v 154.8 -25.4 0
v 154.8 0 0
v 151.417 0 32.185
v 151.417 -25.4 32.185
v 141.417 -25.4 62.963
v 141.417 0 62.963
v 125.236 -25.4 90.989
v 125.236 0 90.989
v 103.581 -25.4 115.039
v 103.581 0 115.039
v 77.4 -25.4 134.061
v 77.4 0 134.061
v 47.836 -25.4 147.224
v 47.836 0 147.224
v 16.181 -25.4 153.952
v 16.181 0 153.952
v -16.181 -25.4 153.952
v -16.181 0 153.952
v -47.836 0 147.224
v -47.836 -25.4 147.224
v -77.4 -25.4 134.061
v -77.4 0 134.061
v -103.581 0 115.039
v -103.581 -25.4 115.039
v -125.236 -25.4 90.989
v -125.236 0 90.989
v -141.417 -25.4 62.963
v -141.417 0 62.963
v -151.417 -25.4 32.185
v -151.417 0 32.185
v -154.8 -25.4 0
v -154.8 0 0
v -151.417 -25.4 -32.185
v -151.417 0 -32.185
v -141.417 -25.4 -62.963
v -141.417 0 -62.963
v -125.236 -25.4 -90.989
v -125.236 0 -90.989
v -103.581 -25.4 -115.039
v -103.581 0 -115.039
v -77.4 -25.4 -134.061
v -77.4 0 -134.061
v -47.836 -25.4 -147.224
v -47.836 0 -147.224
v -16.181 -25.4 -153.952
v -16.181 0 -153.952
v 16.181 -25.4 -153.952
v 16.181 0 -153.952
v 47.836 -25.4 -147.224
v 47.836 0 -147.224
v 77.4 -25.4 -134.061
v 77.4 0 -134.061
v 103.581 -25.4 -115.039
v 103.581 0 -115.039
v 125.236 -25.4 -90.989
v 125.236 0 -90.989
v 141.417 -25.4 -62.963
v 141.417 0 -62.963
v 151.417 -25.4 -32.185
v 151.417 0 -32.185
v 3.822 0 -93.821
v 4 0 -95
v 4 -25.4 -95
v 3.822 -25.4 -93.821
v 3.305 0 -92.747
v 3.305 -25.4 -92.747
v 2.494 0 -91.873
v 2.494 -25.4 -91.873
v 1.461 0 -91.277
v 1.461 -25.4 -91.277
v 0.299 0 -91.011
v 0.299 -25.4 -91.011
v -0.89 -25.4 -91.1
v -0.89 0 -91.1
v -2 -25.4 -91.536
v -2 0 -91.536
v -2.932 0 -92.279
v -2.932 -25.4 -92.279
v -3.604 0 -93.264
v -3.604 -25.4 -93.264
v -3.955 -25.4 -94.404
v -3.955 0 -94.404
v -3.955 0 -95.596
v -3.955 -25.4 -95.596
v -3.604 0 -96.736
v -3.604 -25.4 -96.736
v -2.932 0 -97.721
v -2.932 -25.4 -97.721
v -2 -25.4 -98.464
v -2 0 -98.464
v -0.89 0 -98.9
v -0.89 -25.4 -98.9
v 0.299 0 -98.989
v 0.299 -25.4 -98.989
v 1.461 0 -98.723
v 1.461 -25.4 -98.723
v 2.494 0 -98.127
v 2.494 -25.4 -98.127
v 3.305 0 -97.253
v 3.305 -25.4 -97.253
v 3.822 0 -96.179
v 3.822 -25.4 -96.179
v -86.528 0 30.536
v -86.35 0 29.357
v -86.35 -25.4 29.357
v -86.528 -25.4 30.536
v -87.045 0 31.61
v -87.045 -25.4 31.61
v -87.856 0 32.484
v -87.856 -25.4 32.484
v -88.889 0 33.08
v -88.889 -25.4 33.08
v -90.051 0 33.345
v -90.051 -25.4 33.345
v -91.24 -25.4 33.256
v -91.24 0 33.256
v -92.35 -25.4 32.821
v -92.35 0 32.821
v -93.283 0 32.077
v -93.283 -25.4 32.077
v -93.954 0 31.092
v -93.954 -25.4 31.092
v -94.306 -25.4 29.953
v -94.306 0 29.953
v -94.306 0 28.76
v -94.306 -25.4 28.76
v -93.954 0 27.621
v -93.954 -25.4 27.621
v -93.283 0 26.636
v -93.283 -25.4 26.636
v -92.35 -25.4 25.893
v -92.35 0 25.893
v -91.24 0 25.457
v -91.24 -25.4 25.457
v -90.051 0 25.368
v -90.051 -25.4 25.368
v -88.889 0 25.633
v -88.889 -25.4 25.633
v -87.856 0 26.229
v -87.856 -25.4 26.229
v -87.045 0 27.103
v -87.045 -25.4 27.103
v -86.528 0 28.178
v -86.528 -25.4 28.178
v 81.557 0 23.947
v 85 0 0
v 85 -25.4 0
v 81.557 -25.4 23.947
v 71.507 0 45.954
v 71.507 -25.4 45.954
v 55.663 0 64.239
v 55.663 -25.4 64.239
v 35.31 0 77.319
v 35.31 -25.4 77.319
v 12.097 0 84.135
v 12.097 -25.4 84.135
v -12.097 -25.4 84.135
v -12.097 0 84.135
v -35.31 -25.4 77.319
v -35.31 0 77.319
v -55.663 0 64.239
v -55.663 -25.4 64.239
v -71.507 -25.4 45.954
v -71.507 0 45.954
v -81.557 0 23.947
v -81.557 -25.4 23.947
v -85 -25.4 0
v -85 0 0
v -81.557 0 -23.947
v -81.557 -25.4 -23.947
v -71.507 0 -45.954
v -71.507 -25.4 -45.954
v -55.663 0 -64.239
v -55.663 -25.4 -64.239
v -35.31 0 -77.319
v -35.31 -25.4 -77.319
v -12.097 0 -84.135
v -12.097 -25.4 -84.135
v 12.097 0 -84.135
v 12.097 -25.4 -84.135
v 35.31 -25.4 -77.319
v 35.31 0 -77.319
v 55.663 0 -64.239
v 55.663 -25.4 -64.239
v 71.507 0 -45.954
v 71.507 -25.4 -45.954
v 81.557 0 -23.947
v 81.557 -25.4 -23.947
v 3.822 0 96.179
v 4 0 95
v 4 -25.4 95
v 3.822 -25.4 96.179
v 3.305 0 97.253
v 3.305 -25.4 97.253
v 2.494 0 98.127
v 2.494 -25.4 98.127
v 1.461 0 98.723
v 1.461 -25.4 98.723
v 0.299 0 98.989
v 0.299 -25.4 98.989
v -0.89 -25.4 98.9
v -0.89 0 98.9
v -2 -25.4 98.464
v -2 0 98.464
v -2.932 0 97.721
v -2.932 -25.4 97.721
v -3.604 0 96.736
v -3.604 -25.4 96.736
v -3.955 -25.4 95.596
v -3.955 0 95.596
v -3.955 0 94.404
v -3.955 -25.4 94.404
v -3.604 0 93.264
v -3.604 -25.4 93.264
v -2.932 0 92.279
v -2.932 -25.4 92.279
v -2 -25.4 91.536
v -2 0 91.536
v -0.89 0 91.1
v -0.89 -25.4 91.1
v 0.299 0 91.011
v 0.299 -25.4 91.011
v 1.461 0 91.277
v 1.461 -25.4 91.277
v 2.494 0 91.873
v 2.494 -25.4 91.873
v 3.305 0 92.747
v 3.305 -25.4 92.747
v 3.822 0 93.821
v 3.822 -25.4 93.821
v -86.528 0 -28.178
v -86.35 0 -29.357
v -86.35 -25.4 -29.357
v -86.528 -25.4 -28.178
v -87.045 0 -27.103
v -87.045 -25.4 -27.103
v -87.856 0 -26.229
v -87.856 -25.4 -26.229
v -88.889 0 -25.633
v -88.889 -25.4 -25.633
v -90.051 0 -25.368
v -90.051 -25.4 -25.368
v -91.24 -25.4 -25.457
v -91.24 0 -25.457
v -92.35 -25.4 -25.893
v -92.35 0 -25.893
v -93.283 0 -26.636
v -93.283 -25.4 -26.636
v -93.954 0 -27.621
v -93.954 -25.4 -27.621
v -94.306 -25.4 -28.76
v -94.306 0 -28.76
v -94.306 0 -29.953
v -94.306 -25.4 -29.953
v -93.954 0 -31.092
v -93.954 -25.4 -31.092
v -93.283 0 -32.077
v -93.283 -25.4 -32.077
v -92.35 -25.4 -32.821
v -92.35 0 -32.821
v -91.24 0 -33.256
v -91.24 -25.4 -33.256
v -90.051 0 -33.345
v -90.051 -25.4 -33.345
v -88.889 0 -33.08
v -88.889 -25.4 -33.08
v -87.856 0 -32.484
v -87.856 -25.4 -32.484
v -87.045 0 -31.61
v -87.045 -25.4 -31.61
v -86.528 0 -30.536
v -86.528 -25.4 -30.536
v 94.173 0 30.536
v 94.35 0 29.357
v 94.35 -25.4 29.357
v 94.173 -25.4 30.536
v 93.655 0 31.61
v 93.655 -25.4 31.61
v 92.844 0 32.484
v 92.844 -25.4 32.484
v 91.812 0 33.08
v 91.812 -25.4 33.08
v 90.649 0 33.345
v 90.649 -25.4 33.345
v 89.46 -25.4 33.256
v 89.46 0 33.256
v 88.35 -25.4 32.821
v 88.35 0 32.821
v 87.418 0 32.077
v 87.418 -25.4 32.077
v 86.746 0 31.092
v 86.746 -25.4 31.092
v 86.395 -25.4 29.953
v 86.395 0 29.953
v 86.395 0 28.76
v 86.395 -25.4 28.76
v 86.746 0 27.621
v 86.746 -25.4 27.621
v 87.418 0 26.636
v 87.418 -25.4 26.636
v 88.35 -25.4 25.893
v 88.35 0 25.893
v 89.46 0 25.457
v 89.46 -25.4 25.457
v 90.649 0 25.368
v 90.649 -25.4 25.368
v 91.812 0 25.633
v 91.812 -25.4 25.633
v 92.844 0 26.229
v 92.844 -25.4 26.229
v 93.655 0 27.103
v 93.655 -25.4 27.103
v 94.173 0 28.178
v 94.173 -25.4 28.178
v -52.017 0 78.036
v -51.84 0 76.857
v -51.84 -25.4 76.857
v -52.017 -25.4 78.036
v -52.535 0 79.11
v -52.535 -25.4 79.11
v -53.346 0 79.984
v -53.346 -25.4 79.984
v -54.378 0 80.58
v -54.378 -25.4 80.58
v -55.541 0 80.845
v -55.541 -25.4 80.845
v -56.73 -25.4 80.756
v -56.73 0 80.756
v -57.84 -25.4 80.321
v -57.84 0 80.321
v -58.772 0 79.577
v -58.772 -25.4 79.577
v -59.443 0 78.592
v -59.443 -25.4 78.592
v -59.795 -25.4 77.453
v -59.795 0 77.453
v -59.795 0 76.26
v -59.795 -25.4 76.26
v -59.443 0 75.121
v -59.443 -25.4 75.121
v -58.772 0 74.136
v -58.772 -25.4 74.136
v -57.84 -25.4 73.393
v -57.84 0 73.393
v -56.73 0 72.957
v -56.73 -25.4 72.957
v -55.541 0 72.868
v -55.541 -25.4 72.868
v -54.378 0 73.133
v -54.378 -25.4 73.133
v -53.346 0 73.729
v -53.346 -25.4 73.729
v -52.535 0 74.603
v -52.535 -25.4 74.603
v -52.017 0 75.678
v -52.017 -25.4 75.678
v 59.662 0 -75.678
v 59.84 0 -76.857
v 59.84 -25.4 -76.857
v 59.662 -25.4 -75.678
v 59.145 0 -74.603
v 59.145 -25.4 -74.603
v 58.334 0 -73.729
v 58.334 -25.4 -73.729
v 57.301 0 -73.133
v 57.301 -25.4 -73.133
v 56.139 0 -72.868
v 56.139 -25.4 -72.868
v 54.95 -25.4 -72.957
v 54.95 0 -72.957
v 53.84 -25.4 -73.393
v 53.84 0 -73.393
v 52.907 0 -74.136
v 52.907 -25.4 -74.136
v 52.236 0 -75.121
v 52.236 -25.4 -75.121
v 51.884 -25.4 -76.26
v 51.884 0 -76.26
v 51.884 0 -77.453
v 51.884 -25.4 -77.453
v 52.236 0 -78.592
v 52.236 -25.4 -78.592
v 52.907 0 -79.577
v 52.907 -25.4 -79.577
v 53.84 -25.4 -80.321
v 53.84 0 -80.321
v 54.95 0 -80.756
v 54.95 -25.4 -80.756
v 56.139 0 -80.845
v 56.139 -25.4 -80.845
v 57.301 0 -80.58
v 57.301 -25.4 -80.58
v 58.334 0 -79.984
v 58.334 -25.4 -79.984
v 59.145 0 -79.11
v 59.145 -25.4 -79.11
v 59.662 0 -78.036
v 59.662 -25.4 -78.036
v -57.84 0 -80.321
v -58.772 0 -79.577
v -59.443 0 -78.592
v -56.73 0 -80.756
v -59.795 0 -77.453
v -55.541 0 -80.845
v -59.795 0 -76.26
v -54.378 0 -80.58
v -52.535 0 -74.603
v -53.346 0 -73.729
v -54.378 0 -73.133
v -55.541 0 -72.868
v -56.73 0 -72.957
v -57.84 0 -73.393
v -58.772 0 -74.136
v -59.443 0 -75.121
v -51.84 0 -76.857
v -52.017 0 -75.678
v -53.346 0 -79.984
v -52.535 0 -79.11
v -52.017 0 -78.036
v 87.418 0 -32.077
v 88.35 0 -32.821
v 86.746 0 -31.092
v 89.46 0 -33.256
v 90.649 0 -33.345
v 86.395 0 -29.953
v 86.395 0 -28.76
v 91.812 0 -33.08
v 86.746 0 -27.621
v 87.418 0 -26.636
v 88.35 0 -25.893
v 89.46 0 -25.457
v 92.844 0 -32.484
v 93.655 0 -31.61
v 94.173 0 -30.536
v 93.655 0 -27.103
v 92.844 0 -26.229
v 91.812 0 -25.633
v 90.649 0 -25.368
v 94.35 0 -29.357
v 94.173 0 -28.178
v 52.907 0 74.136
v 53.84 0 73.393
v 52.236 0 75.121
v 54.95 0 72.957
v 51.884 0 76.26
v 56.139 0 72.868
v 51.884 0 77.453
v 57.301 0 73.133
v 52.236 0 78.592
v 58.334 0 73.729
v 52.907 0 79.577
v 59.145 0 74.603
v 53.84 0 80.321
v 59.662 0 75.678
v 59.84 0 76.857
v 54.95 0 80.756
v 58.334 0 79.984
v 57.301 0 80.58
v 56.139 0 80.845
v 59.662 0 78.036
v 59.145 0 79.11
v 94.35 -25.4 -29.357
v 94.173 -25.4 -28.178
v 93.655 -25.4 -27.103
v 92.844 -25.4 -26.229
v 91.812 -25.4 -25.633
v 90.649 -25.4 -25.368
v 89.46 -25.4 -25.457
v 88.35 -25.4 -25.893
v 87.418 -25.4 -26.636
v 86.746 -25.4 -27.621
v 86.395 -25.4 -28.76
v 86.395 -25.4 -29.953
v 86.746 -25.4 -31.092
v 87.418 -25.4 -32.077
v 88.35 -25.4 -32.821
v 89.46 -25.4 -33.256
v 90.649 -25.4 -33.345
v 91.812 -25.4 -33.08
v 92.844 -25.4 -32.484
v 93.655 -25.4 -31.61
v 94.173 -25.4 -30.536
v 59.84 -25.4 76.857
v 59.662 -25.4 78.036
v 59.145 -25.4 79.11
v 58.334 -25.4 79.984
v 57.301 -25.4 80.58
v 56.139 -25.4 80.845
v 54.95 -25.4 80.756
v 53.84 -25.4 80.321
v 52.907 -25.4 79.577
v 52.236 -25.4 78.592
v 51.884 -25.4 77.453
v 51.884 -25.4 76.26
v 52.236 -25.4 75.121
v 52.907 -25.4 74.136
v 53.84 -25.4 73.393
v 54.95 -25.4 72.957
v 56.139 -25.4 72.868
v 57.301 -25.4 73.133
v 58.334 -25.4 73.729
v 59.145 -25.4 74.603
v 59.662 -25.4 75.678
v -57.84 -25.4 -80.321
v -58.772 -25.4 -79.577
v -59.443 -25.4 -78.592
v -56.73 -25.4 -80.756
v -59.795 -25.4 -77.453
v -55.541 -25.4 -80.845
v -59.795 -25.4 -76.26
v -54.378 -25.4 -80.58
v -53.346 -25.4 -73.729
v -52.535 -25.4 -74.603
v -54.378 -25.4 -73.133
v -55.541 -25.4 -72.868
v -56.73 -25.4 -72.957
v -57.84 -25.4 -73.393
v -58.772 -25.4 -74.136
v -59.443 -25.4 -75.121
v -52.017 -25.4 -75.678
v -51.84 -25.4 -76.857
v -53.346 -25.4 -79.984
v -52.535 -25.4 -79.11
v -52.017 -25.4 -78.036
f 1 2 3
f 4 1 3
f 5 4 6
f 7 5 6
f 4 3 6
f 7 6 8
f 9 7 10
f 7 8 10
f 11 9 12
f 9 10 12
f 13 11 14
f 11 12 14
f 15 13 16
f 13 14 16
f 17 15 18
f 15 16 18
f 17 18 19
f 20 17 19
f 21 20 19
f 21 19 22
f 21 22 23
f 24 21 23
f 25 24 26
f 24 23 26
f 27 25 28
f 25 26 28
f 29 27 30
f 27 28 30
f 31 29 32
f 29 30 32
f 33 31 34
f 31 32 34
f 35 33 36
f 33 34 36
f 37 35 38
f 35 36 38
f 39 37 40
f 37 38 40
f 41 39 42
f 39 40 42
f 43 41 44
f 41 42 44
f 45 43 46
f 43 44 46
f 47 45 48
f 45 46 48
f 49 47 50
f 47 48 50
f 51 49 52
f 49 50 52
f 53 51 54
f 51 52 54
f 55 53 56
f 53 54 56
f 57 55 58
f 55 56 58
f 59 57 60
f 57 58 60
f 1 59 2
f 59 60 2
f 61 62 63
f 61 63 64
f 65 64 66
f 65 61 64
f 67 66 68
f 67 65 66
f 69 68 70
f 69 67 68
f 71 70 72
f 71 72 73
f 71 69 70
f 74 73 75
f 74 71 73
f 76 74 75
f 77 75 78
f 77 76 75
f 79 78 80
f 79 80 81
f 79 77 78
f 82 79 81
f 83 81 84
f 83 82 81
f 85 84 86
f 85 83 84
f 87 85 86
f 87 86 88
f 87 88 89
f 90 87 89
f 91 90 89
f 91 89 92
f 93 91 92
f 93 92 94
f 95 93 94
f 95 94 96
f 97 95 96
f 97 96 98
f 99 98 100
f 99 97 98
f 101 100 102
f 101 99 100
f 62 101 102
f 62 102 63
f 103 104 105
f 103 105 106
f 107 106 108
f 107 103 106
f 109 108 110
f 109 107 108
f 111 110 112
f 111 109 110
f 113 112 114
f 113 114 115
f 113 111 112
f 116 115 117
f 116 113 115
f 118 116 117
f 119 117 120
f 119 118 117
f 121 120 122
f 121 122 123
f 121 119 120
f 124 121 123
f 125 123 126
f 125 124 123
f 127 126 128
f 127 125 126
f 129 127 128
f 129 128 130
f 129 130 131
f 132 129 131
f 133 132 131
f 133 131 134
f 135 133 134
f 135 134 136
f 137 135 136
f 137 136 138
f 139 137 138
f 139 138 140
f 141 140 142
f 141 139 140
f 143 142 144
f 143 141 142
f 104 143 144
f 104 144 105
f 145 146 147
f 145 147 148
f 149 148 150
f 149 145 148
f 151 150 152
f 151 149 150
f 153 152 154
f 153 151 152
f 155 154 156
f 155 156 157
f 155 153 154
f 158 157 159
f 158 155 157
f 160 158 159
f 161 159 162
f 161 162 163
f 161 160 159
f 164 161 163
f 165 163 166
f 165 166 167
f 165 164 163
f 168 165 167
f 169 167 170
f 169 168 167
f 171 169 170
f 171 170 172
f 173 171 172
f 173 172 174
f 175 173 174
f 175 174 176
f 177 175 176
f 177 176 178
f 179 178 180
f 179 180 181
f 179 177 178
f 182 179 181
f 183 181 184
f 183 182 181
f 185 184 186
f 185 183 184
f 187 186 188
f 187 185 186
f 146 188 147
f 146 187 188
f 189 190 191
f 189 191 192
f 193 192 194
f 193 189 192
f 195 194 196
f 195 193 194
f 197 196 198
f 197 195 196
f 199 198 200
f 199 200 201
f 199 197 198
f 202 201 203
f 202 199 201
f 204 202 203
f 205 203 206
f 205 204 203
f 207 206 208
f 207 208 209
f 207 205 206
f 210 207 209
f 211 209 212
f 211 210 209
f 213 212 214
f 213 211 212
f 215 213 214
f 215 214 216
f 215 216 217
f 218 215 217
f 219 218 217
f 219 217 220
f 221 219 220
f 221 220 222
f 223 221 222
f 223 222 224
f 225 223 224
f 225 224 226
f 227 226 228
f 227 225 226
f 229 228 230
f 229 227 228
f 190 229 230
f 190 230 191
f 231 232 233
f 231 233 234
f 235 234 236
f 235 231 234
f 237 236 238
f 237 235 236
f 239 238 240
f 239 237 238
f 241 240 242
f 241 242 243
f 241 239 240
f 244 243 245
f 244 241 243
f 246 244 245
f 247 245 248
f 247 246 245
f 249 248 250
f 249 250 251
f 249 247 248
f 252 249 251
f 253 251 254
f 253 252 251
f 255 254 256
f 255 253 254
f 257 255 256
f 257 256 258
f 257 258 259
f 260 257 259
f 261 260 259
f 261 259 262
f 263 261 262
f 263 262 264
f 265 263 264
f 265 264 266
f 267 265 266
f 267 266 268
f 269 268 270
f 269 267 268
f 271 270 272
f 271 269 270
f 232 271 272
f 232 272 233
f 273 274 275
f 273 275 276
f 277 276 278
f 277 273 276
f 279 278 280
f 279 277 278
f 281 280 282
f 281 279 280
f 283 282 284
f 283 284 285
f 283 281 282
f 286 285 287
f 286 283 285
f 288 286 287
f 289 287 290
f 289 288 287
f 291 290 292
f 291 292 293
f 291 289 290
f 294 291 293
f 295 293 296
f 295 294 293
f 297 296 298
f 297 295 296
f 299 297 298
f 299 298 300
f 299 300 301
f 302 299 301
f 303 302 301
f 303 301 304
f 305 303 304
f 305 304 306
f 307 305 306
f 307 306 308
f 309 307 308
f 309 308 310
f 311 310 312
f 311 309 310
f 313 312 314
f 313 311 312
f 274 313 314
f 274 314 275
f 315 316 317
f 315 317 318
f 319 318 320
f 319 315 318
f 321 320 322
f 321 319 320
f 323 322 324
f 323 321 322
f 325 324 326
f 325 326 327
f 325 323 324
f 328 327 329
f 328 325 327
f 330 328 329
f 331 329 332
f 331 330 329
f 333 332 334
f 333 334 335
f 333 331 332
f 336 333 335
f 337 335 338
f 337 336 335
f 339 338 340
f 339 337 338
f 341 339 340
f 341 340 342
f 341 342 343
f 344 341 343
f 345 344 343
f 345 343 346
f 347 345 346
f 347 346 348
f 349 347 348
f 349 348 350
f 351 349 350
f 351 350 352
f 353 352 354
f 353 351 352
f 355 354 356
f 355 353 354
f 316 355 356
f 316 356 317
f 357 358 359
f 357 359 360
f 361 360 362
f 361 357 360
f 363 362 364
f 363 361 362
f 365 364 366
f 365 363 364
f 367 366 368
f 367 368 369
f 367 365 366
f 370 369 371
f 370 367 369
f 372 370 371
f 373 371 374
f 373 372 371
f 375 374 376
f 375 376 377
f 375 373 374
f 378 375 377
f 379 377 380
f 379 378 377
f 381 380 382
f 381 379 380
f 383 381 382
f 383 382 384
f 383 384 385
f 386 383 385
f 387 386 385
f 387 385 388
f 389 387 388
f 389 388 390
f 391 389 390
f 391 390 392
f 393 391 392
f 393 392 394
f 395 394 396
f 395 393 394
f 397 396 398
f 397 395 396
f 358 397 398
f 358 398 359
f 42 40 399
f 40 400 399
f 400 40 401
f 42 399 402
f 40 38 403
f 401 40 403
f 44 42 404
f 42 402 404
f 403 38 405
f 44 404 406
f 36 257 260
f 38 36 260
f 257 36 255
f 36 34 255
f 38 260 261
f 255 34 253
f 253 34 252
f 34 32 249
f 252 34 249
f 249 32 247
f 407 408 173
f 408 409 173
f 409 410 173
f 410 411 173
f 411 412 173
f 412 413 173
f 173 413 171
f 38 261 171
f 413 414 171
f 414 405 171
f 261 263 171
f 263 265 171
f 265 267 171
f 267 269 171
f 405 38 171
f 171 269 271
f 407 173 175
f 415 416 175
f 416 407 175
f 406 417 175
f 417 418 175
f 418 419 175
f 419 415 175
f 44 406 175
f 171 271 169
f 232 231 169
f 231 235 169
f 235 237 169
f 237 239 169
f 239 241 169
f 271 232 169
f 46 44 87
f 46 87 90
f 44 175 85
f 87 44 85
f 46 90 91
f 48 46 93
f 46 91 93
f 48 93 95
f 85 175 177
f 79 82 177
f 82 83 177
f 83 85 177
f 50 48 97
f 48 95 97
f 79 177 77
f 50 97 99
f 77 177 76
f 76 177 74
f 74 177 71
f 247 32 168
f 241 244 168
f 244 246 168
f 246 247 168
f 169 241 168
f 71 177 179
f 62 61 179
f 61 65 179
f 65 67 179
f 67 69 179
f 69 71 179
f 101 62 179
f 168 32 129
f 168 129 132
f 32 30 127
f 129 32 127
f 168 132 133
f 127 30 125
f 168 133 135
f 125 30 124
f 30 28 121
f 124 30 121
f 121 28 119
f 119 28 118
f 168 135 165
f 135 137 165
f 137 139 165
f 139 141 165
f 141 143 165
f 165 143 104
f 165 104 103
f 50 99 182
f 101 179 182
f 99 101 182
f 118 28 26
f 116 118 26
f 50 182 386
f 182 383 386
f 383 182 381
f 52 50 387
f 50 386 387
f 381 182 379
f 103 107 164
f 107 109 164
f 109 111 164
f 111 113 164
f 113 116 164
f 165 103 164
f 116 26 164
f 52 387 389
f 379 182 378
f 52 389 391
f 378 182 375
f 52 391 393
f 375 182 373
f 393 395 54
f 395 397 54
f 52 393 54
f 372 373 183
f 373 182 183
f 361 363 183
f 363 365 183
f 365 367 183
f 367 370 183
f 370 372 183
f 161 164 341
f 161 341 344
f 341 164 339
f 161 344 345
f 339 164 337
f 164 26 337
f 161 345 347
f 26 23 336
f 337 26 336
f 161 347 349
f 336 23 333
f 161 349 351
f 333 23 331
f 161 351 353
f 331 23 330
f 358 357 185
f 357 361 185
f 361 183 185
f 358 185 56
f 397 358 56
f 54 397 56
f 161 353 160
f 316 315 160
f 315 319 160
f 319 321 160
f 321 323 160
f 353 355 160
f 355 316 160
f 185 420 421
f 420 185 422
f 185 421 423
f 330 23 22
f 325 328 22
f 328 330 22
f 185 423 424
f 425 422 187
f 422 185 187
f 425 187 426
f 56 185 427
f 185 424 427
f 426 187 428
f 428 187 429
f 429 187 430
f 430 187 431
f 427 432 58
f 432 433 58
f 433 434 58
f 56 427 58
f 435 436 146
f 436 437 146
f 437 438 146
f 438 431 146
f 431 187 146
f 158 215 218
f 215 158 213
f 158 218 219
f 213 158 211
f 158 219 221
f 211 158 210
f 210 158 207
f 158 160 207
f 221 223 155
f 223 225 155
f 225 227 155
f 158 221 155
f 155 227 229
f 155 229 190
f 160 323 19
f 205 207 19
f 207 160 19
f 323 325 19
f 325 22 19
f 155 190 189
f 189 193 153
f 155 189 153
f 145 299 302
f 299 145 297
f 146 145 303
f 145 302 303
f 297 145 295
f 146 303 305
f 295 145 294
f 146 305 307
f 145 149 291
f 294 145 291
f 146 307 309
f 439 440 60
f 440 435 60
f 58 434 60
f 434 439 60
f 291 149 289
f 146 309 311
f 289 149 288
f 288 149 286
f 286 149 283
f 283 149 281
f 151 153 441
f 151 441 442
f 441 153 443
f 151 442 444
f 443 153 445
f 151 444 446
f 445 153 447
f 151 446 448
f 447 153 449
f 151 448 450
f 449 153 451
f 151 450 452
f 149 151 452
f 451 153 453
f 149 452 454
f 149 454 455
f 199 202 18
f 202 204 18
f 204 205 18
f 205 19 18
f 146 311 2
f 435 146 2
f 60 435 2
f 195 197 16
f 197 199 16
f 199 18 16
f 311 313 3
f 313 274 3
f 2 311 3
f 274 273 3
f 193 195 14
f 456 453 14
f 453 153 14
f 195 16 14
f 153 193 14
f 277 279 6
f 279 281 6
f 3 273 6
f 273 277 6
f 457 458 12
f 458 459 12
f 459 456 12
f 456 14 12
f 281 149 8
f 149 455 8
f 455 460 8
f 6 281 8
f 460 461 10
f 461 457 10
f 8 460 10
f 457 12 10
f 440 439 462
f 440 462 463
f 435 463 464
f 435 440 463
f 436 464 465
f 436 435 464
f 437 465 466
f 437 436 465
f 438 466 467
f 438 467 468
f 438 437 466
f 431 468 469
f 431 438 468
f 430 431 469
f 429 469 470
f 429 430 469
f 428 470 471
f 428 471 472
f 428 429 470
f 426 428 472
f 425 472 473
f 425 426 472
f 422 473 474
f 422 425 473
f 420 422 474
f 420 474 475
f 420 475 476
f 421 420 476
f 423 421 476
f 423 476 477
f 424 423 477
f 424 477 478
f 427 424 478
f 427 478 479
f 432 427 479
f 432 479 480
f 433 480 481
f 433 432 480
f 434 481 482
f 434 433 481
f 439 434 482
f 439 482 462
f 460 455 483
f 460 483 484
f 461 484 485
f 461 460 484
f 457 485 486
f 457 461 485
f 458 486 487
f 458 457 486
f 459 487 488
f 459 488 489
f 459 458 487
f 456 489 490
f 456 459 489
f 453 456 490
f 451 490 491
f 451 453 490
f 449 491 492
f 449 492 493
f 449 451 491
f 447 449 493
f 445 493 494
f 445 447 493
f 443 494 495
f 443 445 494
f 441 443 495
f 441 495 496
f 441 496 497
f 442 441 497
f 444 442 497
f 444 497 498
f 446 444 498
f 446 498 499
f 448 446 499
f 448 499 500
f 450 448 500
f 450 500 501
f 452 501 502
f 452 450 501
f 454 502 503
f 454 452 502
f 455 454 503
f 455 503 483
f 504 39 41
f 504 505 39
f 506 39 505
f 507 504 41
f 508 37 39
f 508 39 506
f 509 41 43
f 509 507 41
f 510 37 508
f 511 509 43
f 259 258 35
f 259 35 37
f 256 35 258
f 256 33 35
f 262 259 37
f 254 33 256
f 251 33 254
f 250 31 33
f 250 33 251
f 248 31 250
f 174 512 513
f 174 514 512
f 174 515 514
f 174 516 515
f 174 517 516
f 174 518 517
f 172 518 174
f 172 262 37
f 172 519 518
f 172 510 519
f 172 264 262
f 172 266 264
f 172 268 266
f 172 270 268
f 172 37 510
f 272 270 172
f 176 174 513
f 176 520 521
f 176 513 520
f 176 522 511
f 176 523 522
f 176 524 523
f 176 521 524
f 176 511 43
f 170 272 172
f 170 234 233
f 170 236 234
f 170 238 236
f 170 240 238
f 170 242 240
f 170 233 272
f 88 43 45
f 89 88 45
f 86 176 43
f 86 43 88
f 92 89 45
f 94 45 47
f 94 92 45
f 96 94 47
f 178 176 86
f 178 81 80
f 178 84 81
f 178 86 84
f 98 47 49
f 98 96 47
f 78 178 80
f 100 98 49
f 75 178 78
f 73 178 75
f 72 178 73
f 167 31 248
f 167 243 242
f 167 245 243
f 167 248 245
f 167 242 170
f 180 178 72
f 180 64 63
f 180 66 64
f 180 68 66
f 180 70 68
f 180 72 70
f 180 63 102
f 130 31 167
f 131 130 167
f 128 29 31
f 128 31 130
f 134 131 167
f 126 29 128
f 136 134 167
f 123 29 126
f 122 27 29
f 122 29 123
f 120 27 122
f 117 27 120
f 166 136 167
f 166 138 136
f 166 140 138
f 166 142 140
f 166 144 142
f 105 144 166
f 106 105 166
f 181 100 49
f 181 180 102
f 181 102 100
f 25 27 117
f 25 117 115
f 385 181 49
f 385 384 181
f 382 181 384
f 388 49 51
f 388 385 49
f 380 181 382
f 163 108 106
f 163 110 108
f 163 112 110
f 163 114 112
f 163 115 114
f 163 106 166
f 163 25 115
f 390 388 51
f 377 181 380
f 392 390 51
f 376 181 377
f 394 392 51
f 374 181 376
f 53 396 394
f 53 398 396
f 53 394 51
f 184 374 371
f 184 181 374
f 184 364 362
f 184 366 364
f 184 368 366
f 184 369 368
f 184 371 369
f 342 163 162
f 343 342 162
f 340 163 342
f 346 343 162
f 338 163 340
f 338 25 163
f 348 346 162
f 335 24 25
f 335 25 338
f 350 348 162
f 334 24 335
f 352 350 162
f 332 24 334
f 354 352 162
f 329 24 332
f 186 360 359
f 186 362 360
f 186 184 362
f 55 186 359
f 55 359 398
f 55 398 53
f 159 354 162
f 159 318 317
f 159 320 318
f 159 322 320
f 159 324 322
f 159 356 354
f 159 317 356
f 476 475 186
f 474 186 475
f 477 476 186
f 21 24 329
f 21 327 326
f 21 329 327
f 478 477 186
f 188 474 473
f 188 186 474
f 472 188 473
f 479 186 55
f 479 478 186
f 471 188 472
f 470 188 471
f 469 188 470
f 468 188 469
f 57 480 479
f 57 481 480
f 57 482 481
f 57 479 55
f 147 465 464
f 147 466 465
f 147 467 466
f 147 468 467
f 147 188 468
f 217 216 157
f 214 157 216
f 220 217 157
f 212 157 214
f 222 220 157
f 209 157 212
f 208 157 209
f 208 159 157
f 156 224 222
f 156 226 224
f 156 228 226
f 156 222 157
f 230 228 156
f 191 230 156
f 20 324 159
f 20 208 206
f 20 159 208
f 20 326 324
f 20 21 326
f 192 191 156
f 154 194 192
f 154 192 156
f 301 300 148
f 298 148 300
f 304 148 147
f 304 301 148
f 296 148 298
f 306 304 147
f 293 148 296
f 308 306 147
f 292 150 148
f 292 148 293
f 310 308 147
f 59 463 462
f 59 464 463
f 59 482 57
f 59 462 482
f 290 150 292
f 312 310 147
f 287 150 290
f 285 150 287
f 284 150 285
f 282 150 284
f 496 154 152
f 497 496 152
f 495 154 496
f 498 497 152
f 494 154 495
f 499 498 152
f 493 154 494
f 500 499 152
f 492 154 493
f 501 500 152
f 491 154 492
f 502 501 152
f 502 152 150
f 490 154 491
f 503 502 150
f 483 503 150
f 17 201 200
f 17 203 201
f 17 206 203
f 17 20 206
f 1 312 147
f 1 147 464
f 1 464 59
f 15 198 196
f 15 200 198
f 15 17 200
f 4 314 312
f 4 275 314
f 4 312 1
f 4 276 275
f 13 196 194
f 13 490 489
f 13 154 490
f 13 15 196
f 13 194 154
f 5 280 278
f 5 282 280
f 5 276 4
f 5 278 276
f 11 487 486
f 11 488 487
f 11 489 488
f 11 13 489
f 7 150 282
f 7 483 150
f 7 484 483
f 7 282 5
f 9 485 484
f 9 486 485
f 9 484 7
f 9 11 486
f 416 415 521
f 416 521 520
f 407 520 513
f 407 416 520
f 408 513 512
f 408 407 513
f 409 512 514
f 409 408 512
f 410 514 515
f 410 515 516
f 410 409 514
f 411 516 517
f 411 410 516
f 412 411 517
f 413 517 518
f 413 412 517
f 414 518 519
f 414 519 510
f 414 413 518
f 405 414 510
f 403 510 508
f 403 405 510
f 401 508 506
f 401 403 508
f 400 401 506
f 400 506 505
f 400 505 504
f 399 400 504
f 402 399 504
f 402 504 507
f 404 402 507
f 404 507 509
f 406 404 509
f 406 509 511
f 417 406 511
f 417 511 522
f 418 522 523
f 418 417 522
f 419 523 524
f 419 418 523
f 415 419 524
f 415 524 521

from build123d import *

# Parameters (mm, degrees)
F0_R     = 154.8
F0_R_2   = 4
F0_R_3   = 85
F1_DEPTH = 25.4


with BuildPart() as f1:
    # F0 (on Front) → F1 (new body)
    with BuildSketch(Plane.XZ):
        Circle(F0_R)
        with Locations((-90.350369, -29.356614)):
            Circle(F0_R_2, mode=Mode.SUBTRACT)
        with Locations((-55.839599, -76.856614)):
            Circle(F0_R_2, mode=Mode.SUBTRACT)
        with Locations((0, -95)):
            Circle(F0_R_2, mode=Mode.SUBTRACT)
        with Locations((55.839599, -76.856614)):
            Circle(F0_R_2, mode=Mode.SUBTRACT)
        with Locations((90.350369, -29.356614)):
            Circle(F0_R_2, mode=Mode.SUBTRACT)
        with Locations((-90.350369, 29.356614)):
            Circle(F0_R_2, mode=Mode.SUBTRACT)
        with Locations((-55.839599, 76.856614)):
            Circle(F0_R_2, mode=Mode.SUBTRACT)
        Circle(F0_R_3, mode=Mode.SUBTRACT)
        with Locations((55.839599, 76.856614)):
            Circle(F0_R_2, mode=Mode.SUBTRACT)
        with Locations((90.350369, 29.356614)):
            Circle(F0_R_2, mode=Mode.SUBTRACT)
        with Locations((0, 95)):
            Circle(F0_R_2, mode=Mode.SUBTRACT)
    extrude(amount=F1_DEPTH)


solid = f1.part
